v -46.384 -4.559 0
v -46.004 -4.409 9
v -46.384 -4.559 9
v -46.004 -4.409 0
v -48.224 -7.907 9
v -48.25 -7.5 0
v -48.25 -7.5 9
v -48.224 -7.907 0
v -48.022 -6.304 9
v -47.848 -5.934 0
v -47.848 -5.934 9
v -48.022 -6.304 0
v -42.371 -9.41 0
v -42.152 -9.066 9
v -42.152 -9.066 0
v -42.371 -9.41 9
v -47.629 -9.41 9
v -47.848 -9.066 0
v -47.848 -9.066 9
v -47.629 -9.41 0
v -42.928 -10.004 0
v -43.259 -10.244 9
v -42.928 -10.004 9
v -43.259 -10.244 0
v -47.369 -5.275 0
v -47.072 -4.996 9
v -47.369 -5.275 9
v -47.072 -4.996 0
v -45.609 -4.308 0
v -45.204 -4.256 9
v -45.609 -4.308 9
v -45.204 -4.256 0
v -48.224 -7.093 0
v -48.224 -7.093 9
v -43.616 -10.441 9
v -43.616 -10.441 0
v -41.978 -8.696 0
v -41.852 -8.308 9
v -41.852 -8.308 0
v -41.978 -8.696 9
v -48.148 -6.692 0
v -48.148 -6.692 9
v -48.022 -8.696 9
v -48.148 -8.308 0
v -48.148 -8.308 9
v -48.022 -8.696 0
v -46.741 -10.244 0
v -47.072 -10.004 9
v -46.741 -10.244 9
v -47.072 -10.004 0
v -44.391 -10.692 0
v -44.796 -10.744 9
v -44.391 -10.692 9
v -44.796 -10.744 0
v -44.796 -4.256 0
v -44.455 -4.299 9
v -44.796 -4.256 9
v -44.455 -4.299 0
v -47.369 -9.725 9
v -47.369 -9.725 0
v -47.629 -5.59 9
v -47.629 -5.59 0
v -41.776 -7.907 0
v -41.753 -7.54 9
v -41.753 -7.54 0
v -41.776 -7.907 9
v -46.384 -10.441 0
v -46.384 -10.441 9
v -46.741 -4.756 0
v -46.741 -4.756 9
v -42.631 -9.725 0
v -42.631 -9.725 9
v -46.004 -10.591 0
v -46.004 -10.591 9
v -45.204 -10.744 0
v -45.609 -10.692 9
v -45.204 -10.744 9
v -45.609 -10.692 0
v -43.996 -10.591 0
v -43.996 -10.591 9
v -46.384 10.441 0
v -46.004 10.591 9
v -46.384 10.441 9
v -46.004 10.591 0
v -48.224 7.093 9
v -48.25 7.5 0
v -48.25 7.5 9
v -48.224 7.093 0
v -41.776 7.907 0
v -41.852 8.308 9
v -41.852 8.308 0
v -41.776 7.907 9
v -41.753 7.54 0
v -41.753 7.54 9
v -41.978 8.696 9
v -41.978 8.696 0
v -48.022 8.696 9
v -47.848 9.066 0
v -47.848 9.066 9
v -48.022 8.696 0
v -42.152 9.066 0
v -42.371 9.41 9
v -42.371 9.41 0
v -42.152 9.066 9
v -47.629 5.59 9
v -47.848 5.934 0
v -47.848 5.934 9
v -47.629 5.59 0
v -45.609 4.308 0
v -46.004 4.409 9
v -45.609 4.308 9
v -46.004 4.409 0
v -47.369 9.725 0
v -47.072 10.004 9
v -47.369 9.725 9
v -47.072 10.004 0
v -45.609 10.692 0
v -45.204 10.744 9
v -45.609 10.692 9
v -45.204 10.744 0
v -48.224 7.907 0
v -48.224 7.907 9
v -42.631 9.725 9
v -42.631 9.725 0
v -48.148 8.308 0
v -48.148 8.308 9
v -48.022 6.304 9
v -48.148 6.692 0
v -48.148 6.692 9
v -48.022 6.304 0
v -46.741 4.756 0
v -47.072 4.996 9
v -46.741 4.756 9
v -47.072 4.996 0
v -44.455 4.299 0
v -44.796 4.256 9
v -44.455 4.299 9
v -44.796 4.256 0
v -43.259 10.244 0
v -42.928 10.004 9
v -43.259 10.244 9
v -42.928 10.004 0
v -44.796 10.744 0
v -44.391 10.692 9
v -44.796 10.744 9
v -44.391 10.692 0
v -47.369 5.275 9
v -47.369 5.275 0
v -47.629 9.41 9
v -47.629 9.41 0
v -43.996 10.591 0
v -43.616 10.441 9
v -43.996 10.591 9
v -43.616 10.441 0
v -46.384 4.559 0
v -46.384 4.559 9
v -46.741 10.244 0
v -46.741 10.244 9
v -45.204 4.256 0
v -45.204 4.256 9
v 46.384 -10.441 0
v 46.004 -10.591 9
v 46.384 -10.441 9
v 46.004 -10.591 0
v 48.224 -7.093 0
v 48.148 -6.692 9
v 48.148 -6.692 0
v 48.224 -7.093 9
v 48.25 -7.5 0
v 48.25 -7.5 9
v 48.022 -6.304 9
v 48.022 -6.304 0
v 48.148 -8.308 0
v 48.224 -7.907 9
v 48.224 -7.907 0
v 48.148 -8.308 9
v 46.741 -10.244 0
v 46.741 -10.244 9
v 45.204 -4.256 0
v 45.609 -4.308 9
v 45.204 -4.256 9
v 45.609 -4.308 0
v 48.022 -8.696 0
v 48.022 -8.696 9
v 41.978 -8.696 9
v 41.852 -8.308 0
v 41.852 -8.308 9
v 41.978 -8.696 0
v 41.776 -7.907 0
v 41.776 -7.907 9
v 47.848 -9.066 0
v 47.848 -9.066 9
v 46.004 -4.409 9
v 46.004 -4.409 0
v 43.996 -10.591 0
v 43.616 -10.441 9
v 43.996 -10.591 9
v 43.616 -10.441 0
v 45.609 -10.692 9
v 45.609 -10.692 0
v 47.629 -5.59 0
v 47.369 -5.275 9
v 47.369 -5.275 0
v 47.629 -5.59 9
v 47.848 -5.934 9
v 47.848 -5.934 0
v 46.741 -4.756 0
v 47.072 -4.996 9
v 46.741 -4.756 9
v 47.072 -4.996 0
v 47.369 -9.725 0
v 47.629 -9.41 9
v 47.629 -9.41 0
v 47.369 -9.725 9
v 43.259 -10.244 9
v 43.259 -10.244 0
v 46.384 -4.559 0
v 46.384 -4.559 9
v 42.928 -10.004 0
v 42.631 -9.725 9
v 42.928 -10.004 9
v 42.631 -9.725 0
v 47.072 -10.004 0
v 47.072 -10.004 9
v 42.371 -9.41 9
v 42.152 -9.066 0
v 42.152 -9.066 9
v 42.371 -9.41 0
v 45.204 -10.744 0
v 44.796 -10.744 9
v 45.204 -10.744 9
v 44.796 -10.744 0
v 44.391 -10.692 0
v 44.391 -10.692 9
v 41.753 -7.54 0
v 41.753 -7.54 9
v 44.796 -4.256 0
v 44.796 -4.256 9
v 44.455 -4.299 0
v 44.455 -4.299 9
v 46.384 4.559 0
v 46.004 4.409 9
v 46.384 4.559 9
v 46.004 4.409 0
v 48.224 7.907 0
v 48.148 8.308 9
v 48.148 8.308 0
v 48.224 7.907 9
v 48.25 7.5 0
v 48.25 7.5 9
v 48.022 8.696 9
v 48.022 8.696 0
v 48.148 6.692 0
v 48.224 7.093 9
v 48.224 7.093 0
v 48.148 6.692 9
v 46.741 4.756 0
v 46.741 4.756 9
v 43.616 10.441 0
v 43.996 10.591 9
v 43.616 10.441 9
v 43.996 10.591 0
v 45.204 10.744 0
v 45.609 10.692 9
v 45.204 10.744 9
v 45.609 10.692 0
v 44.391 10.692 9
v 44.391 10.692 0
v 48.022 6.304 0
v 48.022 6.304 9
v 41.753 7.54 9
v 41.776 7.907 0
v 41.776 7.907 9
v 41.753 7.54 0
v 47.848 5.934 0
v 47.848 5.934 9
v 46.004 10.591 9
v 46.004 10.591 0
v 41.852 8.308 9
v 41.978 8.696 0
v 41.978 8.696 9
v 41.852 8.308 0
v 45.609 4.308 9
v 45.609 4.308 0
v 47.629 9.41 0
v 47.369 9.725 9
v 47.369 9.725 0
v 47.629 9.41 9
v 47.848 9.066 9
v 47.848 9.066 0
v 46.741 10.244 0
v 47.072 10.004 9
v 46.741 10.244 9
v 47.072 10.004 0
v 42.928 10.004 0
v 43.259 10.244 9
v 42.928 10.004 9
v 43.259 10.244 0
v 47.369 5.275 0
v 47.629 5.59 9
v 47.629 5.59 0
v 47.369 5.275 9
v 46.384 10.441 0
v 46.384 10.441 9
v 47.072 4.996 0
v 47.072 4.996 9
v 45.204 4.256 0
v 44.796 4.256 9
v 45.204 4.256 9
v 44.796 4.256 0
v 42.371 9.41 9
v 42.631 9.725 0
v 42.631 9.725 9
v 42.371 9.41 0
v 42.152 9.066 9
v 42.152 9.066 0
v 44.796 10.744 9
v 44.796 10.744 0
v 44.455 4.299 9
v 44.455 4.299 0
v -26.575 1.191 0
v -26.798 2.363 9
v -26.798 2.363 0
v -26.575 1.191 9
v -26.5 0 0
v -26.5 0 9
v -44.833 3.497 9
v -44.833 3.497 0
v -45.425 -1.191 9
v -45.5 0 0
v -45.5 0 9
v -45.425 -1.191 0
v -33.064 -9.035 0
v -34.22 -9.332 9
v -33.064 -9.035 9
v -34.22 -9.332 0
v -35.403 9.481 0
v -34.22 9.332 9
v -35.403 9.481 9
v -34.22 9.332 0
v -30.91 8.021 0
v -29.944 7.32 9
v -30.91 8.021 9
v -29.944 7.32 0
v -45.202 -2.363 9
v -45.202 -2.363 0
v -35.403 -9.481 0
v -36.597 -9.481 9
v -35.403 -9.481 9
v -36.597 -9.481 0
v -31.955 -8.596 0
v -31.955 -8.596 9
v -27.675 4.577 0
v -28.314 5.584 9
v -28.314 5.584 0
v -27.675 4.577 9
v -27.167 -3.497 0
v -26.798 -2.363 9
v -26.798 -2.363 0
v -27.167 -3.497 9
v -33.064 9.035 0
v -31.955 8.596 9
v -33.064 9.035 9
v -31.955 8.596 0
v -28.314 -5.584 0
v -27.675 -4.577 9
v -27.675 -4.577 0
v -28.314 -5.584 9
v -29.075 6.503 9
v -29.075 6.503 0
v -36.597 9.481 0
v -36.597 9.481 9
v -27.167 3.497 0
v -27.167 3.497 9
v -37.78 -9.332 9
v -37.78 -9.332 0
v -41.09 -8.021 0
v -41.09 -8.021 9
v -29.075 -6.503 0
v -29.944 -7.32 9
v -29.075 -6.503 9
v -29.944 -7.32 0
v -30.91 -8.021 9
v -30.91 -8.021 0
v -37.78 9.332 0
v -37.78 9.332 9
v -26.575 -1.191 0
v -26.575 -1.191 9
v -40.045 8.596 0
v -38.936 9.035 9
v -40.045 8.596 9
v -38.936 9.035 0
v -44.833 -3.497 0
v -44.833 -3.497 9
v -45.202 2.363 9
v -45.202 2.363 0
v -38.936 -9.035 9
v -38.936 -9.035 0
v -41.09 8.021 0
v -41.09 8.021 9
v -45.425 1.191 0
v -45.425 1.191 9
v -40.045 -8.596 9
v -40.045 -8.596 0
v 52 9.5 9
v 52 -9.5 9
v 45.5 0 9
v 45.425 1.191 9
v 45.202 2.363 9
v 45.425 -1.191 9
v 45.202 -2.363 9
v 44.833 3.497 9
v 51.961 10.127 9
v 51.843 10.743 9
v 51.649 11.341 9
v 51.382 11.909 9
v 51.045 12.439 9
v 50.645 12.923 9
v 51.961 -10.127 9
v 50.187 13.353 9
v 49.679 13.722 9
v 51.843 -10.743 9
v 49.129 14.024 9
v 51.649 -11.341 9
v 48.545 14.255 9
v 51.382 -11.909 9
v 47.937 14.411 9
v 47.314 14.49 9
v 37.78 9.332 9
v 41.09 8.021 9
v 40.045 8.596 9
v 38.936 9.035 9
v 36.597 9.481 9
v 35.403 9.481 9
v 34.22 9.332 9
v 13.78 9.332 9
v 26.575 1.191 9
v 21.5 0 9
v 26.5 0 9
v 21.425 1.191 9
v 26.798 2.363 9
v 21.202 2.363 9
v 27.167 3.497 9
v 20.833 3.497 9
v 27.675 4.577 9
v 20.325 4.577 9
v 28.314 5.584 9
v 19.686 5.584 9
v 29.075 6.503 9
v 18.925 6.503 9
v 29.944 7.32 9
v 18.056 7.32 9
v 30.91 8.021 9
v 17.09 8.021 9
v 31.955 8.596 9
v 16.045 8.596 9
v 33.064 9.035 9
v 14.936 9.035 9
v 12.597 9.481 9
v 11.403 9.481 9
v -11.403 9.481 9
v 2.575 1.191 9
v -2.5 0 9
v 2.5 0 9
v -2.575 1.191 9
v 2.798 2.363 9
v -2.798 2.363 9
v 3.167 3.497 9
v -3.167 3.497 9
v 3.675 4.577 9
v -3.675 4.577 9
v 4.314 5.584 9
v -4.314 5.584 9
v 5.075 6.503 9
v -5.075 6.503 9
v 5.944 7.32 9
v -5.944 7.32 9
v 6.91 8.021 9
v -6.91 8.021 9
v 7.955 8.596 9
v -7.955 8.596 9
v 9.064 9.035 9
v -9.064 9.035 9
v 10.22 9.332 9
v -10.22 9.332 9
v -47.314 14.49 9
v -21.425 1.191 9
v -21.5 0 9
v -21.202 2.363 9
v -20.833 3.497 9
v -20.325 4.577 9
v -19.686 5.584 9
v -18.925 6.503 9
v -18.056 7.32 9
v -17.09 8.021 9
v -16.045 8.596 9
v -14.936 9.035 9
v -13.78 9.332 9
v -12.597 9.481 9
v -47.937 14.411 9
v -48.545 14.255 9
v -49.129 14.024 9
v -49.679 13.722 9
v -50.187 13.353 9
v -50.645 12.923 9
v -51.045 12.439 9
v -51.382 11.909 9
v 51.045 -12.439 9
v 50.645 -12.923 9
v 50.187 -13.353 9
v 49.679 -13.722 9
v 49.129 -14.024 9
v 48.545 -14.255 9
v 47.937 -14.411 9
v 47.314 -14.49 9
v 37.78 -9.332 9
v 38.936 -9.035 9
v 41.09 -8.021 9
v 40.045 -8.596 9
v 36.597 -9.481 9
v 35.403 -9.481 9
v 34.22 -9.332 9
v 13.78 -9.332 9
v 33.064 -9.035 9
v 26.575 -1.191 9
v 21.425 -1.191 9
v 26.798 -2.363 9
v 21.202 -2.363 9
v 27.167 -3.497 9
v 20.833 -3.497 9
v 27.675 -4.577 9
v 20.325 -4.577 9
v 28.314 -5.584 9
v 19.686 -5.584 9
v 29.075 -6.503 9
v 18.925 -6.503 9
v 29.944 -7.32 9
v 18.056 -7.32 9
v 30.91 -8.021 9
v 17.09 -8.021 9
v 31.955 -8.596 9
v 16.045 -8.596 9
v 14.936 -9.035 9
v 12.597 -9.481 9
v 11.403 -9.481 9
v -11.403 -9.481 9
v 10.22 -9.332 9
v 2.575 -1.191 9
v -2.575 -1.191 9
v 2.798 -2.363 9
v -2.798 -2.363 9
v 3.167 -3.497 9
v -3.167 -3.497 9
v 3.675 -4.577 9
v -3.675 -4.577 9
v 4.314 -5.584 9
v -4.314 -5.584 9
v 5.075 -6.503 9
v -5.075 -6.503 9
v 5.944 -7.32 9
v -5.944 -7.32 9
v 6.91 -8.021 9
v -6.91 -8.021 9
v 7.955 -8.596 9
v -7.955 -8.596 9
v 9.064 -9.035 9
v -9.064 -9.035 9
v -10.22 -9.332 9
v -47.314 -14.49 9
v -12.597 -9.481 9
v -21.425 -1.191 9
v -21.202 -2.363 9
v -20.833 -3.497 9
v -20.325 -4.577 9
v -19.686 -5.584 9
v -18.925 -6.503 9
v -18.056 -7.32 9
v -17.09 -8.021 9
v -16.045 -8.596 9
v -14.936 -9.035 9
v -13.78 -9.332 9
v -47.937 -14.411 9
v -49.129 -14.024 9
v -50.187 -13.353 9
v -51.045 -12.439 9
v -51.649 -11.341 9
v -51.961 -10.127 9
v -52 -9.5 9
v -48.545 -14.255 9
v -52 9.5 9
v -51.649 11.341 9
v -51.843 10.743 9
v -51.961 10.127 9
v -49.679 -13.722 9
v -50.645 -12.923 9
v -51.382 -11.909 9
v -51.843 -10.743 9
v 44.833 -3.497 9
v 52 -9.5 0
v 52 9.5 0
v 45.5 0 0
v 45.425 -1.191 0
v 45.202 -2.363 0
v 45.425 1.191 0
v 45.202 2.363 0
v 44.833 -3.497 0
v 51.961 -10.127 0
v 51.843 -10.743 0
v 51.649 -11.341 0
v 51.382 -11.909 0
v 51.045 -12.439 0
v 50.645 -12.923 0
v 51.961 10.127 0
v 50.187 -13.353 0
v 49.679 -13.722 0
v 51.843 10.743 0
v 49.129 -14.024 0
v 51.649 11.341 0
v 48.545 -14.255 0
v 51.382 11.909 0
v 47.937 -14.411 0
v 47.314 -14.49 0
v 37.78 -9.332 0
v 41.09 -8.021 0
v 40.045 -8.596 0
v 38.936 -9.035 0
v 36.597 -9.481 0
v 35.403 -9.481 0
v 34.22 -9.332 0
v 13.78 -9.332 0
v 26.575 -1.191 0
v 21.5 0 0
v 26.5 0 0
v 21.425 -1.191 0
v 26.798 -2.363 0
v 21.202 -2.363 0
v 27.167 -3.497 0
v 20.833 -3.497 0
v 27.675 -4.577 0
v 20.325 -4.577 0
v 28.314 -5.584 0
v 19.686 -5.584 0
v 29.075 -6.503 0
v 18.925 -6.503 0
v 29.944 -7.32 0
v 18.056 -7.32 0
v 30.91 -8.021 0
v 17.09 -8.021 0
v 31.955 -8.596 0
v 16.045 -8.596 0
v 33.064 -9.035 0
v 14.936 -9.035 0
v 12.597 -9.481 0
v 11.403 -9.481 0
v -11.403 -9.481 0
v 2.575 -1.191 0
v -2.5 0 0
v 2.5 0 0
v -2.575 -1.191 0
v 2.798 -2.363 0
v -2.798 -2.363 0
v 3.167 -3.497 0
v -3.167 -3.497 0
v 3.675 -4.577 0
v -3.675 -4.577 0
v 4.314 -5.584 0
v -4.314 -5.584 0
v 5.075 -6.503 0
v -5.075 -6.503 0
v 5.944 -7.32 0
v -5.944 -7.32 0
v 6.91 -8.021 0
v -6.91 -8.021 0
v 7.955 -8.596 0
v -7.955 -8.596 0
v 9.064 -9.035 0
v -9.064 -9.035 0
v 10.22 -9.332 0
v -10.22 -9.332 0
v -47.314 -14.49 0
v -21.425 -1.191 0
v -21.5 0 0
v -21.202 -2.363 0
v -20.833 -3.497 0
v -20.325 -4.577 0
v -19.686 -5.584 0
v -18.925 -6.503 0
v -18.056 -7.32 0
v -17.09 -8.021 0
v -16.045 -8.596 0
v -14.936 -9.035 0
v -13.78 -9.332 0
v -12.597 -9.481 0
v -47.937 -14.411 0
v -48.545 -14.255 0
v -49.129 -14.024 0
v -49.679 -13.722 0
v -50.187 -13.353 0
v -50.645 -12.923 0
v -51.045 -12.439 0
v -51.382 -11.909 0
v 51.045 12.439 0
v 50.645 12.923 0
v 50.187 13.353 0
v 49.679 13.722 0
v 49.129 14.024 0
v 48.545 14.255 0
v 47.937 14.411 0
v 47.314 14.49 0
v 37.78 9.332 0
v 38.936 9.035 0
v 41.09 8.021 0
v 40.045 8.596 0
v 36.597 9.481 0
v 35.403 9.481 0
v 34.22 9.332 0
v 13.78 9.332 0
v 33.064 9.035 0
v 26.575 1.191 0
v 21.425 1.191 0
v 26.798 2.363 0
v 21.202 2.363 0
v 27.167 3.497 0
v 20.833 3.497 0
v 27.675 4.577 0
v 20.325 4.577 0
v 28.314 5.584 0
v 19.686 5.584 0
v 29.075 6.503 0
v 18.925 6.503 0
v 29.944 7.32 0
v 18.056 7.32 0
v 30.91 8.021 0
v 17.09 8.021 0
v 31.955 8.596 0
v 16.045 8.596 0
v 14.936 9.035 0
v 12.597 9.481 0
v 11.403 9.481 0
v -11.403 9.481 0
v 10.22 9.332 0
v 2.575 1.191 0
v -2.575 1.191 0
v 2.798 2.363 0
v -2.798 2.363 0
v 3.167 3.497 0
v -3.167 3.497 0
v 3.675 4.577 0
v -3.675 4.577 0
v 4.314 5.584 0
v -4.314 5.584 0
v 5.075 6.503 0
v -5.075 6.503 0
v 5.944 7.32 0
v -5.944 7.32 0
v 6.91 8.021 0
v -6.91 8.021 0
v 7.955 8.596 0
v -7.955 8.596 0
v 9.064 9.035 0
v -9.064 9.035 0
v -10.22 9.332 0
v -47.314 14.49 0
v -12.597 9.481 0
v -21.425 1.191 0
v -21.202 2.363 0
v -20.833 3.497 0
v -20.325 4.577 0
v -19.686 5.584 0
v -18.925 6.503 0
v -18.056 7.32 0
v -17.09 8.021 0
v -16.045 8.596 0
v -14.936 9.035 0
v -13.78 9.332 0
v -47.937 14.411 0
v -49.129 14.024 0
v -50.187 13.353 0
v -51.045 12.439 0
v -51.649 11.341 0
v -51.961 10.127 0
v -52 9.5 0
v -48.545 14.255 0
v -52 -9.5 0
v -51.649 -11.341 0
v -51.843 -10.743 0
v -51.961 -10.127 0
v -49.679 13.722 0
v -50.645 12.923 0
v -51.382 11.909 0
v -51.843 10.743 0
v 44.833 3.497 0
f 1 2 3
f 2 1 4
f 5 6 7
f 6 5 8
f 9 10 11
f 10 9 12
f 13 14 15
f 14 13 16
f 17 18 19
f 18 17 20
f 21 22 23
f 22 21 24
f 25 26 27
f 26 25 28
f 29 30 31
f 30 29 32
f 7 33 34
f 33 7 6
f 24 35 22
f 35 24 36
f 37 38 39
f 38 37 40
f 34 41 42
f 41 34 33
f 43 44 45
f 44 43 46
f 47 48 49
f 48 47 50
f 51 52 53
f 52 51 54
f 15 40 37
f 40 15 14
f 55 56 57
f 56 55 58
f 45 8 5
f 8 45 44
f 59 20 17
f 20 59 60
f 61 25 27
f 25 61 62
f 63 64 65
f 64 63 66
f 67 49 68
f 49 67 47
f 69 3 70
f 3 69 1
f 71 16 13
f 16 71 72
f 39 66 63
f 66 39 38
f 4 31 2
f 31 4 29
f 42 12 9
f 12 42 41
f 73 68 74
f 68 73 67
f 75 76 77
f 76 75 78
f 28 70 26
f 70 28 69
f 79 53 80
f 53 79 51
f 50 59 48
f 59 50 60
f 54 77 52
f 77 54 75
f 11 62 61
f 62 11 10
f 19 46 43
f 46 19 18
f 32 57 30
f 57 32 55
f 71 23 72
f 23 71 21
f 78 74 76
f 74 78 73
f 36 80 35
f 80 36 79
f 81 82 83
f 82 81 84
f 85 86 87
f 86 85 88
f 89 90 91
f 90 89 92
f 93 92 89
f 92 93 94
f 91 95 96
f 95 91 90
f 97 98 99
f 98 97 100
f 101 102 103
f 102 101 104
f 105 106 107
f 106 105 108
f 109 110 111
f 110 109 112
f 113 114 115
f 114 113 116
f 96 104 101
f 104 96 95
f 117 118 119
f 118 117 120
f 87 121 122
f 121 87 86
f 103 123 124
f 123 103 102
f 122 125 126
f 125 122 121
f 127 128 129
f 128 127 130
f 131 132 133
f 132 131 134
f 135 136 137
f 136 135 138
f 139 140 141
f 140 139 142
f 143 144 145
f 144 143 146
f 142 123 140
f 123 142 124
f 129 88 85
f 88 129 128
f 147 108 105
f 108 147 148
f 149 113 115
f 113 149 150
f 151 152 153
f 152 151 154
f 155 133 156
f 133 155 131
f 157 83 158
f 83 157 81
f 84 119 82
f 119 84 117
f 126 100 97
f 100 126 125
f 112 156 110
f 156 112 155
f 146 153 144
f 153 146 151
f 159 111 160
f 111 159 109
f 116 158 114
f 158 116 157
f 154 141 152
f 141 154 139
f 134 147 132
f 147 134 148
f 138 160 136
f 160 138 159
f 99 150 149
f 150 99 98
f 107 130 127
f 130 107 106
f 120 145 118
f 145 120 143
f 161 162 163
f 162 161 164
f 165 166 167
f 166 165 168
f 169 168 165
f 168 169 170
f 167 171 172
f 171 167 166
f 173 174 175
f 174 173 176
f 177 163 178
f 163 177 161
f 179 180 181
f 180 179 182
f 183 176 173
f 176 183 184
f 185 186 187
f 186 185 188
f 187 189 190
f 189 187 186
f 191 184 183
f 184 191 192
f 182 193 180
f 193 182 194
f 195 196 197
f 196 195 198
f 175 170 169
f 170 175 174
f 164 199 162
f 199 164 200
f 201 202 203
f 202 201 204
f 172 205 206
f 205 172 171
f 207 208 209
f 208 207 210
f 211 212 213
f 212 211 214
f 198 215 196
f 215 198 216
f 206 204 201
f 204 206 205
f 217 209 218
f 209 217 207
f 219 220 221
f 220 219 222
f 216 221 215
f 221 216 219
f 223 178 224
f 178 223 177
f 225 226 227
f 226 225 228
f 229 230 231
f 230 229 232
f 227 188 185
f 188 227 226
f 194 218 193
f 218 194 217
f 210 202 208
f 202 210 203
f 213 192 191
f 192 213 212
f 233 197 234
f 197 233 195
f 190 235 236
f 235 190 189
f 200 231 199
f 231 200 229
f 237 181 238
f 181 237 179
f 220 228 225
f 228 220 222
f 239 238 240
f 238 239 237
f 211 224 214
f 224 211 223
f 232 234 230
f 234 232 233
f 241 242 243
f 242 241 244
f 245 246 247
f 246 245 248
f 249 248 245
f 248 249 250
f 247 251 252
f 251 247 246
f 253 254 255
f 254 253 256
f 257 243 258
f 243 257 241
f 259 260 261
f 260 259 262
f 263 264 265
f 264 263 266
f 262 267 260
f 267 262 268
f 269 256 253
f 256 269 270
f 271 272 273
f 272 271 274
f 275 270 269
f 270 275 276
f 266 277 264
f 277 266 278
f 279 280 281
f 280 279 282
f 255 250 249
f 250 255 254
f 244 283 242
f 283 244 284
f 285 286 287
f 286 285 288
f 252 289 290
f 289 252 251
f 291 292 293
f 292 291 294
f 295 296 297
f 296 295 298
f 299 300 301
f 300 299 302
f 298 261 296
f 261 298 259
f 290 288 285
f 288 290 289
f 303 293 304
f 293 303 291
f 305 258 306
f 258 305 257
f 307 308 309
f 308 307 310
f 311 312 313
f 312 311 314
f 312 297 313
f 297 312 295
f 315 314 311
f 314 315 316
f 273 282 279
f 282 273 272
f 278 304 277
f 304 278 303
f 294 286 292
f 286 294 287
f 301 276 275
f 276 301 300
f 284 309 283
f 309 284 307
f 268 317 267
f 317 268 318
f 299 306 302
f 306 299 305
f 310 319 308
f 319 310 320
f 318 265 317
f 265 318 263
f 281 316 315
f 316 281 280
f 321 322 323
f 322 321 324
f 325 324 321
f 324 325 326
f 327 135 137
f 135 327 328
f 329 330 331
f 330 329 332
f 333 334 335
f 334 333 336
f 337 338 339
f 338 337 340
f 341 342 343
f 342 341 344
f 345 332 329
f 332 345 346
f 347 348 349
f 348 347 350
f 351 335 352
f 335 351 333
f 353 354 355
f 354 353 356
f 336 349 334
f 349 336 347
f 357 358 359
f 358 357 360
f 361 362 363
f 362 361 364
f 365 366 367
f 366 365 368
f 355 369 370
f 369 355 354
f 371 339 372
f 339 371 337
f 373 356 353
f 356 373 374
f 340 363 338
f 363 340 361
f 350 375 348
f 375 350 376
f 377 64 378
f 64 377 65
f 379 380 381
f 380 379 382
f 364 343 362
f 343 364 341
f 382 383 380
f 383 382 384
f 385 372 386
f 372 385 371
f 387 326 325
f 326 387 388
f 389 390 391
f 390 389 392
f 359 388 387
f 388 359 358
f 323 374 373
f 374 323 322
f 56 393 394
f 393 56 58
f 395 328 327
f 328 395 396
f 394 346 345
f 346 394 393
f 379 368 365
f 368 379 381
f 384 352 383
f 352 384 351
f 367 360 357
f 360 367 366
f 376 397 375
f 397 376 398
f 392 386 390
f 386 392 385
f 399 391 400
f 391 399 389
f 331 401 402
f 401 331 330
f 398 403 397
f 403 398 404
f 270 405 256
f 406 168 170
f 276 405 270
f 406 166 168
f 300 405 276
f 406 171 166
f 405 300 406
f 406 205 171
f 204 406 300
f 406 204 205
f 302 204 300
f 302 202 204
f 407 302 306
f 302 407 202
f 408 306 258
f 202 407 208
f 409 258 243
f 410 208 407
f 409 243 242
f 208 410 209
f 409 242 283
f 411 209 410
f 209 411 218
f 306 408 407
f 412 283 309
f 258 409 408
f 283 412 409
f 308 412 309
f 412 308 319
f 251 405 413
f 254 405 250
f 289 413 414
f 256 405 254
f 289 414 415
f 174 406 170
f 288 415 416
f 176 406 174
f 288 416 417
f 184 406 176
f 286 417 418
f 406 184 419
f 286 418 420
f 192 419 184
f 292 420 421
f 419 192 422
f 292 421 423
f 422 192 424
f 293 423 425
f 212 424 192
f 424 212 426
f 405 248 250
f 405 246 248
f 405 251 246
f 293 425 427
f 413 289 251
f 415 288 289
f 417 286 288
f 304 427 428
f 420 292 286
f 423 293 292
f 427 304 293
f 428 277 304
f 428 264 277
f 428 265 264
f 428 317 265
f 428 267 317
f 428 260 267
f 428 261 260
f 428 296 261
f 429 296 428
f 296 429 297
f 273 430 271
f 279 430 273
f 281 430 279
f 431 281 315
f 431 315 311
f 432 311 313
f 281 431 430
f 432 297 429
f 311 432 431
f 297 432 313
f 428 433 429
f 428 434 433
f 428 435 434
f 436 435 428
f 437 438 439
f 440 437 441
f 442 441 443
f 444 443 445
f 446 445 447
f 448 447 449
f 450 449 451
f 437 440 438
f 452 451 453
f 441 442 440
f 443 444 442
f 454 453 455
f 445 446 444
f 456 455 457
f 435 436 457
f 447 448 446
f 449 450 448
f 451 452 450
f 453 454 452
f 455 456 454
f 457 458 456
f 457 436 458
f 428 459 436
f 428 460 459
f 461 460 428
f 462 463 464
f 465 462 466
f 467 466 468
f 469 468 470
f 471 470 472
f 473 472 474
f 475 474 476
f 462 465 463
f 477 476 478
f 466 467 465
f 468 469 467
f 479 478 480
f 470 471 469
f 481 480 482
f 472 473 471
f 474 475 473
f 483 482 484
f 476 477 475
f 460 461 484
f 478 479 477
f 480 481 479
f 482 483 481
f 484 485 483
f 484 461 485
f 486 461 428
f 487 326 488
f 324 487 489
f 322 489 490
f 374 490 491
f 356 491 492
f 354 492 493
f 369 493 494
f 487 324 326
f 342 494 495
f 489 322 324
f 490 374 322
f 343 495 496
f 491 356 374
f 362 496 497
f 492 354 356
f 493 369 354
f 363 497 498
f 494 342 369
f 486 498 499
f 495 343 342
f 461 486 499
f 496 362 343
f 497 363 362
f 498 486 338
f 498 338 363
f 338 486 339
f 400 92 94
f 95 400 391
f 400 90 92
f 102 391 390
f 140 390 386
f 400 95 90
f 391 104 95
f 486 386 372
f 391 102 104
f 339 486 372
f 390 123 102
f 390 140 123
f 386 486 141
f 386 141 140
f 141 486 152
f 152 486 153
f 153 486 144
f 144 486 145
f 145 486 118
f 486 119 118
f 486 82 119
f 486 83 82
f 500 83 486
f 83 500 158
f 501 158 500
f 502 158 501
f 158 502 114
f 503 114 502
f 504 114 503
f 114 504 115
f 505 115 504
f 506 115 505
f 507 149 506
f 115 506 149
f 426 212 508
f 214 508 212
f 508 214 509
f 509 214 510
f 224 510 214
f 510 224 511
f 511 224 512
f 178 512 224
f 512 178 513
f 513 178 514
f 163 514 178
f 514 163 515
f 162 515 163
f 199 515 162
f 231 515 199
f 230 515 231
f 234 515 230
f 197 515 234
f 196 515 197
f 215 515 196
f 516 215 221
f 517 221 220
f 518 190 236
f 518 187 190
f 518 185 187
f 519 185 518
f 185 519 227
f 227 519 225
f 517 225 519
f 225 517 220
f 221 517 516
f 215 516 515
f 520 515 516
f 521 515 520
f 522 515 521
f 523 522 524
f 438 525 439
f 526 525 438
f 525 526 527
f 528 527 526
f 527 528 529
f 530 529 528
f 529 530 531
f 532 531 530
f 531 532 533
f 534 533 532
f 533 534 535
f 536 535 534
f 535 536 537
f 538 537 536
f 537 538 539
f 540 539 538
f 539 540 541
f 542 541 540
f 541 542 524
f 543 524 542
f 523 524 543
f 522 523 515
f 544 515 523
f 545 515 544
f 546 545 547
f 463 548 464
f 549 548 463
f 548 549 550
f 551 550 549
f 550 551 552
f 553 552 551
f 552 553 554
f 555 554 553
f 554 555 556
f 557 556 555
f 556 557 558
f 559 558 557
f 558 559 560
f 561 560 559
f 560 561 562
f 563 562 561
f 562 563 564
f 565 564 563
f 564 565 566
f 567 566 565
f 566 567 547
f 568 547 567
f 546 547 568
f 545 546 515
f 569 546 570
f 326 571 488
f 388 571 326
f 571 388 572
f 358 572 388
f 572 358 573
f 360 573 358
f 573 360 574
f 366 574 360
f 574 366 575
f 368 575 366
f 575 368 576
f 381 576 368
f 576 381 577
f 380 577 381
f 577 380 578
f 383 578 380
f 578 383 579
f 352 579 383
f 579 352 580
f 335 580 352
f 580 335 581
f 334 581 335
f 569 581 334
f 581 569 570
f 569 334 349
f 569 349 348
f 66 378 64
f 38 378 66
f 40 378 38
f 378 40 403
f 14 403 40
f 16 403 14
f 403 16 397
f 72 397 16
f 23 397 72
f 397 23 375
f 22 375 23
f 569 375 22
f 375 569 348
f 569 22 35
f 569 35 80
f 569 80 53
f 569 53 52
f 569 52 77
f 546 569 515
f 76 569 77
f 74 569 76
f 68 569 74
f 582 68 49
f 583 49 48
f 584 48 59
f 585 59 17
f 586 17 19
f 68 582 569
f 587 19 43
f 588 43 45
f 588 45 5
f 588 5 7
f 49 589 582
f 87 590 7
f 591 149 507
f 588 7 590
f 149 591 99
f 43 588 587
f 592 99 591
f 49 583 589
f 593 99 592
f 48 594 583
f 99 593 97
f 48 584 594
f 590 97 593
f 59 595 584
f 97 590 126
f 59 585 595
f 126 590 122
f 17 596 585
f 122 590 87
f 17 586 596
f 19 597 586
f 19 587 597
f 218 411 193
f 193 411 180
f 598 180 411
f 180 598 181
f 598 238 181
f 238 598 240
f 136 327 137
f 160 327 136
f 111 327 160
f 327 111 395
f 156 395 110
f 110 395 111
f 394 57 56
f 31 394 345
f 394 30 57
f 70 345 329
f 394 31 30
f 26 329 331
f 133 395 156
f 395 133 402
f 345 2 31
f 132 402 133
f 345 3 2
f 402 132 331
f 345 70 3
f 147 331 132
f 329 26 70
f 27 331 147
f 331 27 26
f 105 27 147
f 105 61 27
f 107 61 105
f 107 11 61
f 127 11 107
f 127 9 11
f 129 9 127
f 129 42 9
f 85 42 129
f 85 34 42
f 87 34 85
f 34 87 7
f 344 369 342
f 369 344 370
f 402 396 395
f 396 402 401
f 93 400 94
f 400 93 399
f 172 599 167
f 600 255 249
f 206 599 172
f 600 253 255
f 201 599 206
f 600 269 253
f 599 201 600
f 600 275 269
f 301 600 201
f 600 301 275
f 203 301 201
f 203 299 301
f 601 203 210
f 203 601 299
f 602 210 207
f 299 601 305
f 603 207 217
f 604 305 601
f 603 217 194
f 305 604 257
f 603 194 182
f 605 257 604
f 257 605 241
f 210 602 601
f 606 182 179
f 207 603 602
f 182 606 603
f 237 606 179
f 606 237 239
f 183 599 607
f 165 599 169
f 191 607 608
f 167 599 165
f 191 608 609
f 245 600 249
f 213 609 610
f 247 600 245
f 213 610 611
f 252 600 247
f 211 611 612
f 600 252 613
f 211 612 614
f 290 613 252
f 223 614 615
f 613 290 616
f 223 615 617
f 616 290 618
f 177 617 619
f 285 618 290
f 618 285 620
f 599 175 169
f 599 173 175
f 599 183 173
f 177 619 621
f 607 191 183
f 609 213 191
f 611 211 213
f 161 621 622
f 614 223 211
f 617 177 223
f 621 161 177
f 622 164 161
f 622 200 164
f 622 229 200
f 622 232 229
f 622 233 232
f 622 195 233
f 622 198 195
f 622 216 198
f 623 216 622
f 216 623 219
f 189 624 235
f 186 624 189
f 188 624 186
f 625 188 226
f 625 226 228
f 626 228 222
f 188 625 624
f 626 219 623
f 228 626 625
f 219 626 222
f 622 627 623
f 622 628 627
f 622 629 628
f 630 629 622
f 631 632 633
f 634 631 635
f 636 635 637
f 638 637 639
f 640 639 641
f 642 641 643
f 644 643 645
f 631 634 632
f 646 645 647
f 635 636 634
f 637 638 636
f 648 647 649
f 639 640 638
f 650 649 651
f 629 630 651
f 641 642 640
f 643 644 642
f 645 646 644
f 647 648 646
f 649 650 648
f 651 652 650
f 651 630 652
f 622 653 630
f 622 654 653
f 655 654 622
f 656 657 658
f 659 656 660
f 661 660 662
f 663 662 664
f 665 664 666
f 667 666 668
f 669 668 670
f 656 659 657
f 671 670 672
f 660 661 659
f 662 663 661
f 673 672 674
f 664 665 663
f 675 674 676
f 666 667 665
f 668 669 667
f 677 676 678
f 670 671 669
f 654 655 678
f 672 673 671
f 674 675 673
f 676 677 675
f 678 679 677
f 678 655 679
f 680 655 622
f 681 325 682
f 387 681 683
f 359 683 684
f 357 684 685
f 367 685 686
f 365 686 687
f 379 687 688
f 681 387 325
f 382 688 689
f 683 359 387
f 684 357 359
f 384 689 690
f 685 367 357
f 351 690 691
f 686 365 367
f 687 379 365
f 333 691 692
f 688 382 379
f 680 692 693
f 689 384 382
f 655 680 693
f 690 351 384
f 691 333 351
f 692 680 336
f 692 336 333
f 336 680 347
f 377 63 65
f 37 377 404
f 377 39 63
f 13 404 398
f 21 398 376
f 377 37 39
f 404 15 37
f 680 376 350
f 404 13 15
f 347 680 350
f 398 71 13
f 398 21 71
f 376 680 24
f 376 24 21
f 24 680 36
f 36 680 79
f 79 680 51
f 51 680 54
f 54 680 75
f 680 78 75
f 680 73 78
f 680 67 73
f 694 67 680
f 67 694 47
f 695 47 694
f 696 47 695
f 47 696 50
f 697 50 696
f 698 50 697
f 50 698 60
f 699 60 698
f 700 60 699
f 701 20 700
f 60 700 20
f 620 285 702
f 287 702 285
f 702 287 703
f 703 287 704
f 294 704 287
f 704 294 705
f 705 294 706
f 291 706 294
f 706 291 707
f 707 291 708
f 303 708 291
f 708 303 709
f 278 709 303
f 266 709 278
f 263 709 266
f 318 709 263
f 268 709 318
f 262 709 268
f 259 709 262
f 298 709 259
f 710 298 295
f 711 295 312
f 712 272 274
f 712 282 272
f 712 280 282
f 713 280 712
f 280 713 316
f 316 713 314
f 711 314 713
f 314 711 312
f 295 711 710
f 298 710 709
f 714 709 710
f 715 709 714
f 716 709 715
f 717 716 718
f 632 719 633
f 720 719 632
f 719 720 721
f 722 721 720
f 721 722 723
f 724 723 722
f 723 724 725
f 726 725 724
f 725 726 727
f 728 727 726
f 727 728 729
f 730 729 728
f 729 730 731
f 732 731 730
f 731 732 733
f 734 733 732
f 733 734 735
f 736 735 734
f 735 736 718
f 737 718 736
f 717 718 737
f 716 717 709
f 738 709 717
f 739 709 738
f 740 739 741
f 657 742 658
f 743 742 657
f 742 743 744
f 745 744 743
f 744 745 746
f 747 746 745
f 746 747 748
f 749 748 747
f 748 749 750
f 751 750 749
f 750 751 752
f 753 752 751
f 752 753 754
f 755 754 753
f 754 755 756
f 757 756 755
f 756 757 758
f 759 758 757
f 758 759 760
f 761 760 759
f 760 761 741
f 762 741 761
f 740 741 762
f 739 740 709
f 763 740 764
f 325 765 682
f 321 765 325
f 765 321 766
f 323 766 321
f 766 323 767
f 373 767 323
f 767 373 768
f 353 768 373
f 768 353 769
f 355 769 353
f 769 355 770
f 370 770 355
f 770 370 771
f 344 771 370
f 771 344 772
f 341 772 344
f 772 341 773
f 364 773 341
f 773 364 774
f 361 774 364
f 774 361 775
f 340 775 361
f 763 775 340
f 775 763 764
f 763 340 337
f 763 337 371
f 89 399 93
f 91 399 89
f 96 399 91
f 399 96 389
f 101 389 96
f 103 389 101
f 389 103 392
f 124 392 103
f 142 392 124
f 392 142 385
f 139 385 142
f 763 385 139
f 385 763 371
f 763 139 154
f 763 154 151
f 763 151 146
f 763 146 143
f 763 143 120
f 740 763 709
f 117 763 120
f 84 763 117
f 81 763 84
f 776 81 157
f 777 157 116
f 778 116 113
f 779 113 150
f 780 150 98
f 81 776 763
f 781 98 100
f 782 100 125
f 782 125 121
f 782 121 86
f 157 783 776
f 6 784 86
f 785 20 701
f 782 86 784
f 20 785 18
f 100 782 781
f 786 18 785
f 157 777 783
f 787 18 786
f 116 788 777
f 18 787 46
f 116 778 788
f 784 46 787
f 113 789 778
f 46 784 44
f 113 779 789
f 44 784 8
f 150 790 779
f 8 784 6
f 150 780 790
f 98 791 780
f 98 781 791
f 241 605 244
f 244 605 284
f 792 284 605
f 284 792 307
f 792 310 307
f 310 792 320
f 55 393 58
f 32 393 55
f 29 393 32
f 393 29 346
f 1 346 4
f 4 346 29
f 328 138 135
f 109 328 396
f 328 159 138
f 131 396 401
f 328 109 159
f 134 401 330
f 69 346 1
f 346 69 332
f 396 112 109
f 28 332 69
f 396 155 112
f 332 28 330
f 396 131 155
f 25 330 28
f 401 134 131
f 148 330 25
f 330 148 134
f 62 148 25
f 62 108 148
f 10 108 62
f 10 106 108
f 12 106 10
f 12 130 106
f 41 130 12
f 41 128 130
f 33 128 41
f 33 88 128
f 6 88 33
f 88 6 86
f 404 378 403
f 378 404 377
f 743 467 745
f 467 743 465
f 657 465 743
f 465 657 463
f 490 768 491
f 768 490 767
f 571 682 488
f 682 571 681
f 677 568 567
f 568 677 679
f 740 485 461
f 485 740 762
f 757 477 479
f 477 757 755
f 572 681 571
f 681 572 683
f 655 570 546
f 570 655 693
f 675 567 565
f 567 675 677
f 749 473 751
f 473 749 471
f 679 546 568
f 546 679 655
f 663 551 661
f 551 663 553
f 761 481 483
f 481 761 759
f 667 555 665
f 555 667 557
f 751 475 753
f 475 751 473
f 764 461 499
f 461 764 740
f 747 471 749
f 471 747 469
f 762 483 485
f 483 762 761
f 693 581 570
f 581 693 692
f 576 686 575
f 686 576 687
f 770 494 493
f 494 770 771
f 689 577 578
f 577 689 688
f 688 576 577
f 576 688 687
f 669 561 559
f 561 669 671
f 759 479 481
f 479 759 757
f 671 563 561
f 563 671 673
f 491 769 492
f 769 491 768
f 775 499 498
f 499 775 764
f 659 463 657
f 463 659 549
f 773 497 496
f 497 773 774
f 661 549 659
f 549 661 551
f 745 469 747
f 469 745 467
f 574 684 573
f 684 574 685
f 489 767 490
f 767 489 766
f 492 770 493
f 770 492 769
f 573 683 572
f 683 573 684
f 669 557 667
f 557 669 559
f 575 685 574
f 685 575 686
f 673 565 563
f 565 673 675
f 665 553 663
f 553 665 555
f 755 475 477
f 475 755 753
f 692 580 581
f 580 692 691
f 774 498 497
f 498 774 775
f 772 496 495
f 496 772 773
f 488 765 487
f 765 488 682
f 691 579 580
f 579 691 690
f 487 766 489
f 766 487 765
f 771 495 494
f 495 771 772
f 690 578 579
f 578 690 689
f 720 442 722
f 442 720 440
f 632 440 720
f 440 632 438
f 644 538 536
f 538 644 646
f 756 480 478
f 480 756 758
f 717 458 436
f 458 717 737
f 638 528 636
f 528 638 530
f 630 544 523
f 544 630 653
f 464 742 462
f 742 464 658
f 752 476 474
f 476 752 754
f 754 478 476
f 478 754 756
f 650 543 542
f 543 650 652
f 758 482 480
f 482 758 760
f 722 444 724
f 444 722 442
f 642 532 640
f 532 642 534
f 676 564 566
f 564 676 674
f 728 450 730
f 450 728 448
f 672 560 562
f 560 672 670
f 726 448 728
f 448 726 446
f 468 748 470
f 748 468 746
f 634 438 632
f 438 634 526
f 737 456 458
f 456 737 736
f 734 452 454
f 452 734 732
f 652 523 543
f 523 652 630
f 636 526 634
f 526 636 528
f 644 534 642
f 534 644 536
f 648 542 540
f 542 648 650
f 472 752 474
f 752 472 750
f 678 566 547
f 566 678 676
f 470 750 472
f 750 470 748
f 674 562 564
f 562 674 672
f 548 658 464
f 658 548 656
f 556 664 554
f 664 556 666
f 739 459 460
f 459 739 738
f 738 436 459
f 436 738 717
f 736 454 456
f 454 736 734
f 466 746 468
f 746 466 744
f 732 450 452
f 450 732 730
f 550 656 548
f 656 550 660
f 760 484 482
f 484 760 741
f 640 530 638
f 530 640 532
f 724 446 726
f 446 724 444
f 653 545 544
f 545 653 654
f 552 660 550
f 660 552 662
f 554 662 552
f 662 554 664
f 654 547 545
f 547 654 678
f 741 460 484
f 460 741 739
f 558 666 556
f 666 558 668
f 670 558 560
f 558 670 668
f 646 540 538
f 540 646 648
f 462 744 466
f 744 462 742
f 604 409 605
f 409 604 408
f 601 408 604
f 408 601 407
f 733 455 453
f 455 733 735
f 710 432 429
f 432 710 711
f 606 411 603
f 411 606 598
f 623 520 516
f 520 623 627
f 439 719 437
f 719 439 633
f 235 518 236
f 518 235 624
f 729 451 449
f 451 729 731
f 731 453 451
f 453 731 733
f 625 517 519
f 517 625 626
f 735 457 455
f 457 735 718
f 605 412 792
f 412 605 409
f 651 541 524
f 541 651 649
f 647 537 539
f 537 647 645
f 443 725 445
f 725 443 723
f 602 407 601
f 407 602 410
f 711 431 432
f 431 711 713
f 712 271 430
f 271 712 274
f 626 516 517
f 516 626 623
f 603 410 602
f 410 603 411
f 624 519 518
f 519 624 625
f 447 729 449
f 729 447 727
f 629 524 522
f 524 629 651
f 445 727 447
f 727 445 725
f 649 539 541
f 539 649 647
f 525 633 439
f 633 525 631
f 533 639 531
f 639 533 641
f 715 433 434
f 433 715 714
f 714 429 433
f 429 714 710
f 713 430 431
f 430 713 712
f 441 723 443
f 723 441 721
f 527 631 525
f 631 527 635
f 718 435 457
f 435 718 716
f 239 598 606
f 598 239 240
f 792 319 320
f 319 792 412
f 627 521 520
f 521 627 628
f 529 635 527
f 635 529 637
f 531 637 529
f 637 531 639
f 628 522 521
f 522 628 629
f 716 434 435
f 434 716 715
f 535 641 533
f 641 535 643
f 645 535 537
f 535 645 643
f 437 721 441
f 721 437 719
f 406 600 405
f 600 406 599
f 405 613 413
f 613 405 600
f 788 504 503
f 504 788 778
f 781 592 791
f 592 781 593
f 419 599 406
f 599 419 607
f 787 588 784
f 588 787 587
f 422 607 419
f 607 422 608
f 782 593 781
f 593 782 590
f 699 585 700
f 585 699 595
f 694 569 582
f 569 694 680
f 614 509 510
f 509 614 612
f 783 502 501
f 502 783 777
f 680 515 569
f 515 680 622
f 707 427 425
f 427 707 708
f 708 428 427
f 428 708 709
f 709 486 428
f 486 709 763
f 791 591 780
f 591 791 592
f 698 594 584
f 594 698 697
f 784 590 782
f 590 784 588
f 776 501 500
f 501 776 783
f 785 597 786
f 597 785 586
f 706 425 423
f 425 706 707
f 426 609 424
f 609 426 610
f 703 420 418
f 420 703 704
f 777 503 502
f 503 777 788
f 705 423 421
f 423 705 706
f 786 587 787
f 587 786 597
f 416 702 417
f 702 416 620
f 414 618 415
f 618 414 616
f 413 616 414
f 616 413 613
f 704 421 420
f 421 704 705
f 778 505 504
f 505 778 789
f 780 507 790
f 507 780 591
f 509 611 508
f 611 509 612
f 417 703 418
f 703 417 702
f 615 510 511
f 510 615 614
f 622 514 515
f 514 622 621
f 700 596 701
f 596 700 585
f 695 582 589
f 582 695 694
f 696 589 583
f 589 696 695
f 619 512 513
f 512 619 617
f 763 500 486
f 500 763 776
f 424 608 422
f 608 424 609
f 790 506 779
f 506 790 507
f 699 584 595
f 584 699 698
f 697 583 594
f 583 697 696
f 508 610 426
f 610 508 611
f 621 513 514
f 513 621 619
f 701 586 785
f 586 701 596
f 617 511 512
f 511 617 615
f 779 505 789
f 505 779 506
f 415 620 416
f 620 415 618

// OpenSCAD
$fn = 50;

difference() {
	union() {
		hull() {
			translate(v = [-47.0, 9.5, 0]) {
				cylinder(h = 9, r = 5);
			}
			translate(v = [47.0, 9.5, 0]) {
				cylinder(h = 9, r = 5);
			}
			translate(v = [-47.0, -9.5, 0]) {
				cylinder(h = 9, r = 5);
			}
			translate(v = [47.0, -9.5, 0]) {
				cylinder(h = 9, r = 5);
			}
		}
	}
	union() {
		translate(v = [-45.0, -7.5, -100.0]) {
			cylinder(h = 200, r = 3.25);
		}
		translate(v = [-45.0, 7.5, -100.0]) {
			cylinder(h = 200, r = 3.25);
		}
		translate(v = [45.0, -7.5, -100.0]) {
			cylinder(h = 200, r = 3.25);
		}
		translate(v = [45.0, 7.5, -100.0]) {
			cylinder(h = 200, r = 3.25);
		}
		translate(v = [-45.0, -7.5, -100.0]) {
			cylinder(h = 200, r = 1.8);
		}
		translate(v = [-45.0, 7.5, -100.0]) {
			cylinder(h = 200, r = 1.8);
		}
		translate(v = [45.0, -7.5, -100.0]) {
			cylinder(h = 200, r = 1.8);
		}
		translate(v = [45.0, 7.5, -100.0]) {
			cylinder(h = 200, r = 1.8);
		}
		translate(v = [-36.0, 0, 0.0]) {
			cylinder(h = 9, r = 9.5);
		}
		translate(v = [-12.0, 0, 0.0]) {
			cylinder(h = 9, r = 9.5);
		}
		translate(v = [12.0, 0, 0.0]) {
			cylinder(h = 9, r = 9.5);
		}
		translate(v = [36.0, 0, 0.0]) {
			cylinder(h = 9, r = 9.5);
		}
	}
}
